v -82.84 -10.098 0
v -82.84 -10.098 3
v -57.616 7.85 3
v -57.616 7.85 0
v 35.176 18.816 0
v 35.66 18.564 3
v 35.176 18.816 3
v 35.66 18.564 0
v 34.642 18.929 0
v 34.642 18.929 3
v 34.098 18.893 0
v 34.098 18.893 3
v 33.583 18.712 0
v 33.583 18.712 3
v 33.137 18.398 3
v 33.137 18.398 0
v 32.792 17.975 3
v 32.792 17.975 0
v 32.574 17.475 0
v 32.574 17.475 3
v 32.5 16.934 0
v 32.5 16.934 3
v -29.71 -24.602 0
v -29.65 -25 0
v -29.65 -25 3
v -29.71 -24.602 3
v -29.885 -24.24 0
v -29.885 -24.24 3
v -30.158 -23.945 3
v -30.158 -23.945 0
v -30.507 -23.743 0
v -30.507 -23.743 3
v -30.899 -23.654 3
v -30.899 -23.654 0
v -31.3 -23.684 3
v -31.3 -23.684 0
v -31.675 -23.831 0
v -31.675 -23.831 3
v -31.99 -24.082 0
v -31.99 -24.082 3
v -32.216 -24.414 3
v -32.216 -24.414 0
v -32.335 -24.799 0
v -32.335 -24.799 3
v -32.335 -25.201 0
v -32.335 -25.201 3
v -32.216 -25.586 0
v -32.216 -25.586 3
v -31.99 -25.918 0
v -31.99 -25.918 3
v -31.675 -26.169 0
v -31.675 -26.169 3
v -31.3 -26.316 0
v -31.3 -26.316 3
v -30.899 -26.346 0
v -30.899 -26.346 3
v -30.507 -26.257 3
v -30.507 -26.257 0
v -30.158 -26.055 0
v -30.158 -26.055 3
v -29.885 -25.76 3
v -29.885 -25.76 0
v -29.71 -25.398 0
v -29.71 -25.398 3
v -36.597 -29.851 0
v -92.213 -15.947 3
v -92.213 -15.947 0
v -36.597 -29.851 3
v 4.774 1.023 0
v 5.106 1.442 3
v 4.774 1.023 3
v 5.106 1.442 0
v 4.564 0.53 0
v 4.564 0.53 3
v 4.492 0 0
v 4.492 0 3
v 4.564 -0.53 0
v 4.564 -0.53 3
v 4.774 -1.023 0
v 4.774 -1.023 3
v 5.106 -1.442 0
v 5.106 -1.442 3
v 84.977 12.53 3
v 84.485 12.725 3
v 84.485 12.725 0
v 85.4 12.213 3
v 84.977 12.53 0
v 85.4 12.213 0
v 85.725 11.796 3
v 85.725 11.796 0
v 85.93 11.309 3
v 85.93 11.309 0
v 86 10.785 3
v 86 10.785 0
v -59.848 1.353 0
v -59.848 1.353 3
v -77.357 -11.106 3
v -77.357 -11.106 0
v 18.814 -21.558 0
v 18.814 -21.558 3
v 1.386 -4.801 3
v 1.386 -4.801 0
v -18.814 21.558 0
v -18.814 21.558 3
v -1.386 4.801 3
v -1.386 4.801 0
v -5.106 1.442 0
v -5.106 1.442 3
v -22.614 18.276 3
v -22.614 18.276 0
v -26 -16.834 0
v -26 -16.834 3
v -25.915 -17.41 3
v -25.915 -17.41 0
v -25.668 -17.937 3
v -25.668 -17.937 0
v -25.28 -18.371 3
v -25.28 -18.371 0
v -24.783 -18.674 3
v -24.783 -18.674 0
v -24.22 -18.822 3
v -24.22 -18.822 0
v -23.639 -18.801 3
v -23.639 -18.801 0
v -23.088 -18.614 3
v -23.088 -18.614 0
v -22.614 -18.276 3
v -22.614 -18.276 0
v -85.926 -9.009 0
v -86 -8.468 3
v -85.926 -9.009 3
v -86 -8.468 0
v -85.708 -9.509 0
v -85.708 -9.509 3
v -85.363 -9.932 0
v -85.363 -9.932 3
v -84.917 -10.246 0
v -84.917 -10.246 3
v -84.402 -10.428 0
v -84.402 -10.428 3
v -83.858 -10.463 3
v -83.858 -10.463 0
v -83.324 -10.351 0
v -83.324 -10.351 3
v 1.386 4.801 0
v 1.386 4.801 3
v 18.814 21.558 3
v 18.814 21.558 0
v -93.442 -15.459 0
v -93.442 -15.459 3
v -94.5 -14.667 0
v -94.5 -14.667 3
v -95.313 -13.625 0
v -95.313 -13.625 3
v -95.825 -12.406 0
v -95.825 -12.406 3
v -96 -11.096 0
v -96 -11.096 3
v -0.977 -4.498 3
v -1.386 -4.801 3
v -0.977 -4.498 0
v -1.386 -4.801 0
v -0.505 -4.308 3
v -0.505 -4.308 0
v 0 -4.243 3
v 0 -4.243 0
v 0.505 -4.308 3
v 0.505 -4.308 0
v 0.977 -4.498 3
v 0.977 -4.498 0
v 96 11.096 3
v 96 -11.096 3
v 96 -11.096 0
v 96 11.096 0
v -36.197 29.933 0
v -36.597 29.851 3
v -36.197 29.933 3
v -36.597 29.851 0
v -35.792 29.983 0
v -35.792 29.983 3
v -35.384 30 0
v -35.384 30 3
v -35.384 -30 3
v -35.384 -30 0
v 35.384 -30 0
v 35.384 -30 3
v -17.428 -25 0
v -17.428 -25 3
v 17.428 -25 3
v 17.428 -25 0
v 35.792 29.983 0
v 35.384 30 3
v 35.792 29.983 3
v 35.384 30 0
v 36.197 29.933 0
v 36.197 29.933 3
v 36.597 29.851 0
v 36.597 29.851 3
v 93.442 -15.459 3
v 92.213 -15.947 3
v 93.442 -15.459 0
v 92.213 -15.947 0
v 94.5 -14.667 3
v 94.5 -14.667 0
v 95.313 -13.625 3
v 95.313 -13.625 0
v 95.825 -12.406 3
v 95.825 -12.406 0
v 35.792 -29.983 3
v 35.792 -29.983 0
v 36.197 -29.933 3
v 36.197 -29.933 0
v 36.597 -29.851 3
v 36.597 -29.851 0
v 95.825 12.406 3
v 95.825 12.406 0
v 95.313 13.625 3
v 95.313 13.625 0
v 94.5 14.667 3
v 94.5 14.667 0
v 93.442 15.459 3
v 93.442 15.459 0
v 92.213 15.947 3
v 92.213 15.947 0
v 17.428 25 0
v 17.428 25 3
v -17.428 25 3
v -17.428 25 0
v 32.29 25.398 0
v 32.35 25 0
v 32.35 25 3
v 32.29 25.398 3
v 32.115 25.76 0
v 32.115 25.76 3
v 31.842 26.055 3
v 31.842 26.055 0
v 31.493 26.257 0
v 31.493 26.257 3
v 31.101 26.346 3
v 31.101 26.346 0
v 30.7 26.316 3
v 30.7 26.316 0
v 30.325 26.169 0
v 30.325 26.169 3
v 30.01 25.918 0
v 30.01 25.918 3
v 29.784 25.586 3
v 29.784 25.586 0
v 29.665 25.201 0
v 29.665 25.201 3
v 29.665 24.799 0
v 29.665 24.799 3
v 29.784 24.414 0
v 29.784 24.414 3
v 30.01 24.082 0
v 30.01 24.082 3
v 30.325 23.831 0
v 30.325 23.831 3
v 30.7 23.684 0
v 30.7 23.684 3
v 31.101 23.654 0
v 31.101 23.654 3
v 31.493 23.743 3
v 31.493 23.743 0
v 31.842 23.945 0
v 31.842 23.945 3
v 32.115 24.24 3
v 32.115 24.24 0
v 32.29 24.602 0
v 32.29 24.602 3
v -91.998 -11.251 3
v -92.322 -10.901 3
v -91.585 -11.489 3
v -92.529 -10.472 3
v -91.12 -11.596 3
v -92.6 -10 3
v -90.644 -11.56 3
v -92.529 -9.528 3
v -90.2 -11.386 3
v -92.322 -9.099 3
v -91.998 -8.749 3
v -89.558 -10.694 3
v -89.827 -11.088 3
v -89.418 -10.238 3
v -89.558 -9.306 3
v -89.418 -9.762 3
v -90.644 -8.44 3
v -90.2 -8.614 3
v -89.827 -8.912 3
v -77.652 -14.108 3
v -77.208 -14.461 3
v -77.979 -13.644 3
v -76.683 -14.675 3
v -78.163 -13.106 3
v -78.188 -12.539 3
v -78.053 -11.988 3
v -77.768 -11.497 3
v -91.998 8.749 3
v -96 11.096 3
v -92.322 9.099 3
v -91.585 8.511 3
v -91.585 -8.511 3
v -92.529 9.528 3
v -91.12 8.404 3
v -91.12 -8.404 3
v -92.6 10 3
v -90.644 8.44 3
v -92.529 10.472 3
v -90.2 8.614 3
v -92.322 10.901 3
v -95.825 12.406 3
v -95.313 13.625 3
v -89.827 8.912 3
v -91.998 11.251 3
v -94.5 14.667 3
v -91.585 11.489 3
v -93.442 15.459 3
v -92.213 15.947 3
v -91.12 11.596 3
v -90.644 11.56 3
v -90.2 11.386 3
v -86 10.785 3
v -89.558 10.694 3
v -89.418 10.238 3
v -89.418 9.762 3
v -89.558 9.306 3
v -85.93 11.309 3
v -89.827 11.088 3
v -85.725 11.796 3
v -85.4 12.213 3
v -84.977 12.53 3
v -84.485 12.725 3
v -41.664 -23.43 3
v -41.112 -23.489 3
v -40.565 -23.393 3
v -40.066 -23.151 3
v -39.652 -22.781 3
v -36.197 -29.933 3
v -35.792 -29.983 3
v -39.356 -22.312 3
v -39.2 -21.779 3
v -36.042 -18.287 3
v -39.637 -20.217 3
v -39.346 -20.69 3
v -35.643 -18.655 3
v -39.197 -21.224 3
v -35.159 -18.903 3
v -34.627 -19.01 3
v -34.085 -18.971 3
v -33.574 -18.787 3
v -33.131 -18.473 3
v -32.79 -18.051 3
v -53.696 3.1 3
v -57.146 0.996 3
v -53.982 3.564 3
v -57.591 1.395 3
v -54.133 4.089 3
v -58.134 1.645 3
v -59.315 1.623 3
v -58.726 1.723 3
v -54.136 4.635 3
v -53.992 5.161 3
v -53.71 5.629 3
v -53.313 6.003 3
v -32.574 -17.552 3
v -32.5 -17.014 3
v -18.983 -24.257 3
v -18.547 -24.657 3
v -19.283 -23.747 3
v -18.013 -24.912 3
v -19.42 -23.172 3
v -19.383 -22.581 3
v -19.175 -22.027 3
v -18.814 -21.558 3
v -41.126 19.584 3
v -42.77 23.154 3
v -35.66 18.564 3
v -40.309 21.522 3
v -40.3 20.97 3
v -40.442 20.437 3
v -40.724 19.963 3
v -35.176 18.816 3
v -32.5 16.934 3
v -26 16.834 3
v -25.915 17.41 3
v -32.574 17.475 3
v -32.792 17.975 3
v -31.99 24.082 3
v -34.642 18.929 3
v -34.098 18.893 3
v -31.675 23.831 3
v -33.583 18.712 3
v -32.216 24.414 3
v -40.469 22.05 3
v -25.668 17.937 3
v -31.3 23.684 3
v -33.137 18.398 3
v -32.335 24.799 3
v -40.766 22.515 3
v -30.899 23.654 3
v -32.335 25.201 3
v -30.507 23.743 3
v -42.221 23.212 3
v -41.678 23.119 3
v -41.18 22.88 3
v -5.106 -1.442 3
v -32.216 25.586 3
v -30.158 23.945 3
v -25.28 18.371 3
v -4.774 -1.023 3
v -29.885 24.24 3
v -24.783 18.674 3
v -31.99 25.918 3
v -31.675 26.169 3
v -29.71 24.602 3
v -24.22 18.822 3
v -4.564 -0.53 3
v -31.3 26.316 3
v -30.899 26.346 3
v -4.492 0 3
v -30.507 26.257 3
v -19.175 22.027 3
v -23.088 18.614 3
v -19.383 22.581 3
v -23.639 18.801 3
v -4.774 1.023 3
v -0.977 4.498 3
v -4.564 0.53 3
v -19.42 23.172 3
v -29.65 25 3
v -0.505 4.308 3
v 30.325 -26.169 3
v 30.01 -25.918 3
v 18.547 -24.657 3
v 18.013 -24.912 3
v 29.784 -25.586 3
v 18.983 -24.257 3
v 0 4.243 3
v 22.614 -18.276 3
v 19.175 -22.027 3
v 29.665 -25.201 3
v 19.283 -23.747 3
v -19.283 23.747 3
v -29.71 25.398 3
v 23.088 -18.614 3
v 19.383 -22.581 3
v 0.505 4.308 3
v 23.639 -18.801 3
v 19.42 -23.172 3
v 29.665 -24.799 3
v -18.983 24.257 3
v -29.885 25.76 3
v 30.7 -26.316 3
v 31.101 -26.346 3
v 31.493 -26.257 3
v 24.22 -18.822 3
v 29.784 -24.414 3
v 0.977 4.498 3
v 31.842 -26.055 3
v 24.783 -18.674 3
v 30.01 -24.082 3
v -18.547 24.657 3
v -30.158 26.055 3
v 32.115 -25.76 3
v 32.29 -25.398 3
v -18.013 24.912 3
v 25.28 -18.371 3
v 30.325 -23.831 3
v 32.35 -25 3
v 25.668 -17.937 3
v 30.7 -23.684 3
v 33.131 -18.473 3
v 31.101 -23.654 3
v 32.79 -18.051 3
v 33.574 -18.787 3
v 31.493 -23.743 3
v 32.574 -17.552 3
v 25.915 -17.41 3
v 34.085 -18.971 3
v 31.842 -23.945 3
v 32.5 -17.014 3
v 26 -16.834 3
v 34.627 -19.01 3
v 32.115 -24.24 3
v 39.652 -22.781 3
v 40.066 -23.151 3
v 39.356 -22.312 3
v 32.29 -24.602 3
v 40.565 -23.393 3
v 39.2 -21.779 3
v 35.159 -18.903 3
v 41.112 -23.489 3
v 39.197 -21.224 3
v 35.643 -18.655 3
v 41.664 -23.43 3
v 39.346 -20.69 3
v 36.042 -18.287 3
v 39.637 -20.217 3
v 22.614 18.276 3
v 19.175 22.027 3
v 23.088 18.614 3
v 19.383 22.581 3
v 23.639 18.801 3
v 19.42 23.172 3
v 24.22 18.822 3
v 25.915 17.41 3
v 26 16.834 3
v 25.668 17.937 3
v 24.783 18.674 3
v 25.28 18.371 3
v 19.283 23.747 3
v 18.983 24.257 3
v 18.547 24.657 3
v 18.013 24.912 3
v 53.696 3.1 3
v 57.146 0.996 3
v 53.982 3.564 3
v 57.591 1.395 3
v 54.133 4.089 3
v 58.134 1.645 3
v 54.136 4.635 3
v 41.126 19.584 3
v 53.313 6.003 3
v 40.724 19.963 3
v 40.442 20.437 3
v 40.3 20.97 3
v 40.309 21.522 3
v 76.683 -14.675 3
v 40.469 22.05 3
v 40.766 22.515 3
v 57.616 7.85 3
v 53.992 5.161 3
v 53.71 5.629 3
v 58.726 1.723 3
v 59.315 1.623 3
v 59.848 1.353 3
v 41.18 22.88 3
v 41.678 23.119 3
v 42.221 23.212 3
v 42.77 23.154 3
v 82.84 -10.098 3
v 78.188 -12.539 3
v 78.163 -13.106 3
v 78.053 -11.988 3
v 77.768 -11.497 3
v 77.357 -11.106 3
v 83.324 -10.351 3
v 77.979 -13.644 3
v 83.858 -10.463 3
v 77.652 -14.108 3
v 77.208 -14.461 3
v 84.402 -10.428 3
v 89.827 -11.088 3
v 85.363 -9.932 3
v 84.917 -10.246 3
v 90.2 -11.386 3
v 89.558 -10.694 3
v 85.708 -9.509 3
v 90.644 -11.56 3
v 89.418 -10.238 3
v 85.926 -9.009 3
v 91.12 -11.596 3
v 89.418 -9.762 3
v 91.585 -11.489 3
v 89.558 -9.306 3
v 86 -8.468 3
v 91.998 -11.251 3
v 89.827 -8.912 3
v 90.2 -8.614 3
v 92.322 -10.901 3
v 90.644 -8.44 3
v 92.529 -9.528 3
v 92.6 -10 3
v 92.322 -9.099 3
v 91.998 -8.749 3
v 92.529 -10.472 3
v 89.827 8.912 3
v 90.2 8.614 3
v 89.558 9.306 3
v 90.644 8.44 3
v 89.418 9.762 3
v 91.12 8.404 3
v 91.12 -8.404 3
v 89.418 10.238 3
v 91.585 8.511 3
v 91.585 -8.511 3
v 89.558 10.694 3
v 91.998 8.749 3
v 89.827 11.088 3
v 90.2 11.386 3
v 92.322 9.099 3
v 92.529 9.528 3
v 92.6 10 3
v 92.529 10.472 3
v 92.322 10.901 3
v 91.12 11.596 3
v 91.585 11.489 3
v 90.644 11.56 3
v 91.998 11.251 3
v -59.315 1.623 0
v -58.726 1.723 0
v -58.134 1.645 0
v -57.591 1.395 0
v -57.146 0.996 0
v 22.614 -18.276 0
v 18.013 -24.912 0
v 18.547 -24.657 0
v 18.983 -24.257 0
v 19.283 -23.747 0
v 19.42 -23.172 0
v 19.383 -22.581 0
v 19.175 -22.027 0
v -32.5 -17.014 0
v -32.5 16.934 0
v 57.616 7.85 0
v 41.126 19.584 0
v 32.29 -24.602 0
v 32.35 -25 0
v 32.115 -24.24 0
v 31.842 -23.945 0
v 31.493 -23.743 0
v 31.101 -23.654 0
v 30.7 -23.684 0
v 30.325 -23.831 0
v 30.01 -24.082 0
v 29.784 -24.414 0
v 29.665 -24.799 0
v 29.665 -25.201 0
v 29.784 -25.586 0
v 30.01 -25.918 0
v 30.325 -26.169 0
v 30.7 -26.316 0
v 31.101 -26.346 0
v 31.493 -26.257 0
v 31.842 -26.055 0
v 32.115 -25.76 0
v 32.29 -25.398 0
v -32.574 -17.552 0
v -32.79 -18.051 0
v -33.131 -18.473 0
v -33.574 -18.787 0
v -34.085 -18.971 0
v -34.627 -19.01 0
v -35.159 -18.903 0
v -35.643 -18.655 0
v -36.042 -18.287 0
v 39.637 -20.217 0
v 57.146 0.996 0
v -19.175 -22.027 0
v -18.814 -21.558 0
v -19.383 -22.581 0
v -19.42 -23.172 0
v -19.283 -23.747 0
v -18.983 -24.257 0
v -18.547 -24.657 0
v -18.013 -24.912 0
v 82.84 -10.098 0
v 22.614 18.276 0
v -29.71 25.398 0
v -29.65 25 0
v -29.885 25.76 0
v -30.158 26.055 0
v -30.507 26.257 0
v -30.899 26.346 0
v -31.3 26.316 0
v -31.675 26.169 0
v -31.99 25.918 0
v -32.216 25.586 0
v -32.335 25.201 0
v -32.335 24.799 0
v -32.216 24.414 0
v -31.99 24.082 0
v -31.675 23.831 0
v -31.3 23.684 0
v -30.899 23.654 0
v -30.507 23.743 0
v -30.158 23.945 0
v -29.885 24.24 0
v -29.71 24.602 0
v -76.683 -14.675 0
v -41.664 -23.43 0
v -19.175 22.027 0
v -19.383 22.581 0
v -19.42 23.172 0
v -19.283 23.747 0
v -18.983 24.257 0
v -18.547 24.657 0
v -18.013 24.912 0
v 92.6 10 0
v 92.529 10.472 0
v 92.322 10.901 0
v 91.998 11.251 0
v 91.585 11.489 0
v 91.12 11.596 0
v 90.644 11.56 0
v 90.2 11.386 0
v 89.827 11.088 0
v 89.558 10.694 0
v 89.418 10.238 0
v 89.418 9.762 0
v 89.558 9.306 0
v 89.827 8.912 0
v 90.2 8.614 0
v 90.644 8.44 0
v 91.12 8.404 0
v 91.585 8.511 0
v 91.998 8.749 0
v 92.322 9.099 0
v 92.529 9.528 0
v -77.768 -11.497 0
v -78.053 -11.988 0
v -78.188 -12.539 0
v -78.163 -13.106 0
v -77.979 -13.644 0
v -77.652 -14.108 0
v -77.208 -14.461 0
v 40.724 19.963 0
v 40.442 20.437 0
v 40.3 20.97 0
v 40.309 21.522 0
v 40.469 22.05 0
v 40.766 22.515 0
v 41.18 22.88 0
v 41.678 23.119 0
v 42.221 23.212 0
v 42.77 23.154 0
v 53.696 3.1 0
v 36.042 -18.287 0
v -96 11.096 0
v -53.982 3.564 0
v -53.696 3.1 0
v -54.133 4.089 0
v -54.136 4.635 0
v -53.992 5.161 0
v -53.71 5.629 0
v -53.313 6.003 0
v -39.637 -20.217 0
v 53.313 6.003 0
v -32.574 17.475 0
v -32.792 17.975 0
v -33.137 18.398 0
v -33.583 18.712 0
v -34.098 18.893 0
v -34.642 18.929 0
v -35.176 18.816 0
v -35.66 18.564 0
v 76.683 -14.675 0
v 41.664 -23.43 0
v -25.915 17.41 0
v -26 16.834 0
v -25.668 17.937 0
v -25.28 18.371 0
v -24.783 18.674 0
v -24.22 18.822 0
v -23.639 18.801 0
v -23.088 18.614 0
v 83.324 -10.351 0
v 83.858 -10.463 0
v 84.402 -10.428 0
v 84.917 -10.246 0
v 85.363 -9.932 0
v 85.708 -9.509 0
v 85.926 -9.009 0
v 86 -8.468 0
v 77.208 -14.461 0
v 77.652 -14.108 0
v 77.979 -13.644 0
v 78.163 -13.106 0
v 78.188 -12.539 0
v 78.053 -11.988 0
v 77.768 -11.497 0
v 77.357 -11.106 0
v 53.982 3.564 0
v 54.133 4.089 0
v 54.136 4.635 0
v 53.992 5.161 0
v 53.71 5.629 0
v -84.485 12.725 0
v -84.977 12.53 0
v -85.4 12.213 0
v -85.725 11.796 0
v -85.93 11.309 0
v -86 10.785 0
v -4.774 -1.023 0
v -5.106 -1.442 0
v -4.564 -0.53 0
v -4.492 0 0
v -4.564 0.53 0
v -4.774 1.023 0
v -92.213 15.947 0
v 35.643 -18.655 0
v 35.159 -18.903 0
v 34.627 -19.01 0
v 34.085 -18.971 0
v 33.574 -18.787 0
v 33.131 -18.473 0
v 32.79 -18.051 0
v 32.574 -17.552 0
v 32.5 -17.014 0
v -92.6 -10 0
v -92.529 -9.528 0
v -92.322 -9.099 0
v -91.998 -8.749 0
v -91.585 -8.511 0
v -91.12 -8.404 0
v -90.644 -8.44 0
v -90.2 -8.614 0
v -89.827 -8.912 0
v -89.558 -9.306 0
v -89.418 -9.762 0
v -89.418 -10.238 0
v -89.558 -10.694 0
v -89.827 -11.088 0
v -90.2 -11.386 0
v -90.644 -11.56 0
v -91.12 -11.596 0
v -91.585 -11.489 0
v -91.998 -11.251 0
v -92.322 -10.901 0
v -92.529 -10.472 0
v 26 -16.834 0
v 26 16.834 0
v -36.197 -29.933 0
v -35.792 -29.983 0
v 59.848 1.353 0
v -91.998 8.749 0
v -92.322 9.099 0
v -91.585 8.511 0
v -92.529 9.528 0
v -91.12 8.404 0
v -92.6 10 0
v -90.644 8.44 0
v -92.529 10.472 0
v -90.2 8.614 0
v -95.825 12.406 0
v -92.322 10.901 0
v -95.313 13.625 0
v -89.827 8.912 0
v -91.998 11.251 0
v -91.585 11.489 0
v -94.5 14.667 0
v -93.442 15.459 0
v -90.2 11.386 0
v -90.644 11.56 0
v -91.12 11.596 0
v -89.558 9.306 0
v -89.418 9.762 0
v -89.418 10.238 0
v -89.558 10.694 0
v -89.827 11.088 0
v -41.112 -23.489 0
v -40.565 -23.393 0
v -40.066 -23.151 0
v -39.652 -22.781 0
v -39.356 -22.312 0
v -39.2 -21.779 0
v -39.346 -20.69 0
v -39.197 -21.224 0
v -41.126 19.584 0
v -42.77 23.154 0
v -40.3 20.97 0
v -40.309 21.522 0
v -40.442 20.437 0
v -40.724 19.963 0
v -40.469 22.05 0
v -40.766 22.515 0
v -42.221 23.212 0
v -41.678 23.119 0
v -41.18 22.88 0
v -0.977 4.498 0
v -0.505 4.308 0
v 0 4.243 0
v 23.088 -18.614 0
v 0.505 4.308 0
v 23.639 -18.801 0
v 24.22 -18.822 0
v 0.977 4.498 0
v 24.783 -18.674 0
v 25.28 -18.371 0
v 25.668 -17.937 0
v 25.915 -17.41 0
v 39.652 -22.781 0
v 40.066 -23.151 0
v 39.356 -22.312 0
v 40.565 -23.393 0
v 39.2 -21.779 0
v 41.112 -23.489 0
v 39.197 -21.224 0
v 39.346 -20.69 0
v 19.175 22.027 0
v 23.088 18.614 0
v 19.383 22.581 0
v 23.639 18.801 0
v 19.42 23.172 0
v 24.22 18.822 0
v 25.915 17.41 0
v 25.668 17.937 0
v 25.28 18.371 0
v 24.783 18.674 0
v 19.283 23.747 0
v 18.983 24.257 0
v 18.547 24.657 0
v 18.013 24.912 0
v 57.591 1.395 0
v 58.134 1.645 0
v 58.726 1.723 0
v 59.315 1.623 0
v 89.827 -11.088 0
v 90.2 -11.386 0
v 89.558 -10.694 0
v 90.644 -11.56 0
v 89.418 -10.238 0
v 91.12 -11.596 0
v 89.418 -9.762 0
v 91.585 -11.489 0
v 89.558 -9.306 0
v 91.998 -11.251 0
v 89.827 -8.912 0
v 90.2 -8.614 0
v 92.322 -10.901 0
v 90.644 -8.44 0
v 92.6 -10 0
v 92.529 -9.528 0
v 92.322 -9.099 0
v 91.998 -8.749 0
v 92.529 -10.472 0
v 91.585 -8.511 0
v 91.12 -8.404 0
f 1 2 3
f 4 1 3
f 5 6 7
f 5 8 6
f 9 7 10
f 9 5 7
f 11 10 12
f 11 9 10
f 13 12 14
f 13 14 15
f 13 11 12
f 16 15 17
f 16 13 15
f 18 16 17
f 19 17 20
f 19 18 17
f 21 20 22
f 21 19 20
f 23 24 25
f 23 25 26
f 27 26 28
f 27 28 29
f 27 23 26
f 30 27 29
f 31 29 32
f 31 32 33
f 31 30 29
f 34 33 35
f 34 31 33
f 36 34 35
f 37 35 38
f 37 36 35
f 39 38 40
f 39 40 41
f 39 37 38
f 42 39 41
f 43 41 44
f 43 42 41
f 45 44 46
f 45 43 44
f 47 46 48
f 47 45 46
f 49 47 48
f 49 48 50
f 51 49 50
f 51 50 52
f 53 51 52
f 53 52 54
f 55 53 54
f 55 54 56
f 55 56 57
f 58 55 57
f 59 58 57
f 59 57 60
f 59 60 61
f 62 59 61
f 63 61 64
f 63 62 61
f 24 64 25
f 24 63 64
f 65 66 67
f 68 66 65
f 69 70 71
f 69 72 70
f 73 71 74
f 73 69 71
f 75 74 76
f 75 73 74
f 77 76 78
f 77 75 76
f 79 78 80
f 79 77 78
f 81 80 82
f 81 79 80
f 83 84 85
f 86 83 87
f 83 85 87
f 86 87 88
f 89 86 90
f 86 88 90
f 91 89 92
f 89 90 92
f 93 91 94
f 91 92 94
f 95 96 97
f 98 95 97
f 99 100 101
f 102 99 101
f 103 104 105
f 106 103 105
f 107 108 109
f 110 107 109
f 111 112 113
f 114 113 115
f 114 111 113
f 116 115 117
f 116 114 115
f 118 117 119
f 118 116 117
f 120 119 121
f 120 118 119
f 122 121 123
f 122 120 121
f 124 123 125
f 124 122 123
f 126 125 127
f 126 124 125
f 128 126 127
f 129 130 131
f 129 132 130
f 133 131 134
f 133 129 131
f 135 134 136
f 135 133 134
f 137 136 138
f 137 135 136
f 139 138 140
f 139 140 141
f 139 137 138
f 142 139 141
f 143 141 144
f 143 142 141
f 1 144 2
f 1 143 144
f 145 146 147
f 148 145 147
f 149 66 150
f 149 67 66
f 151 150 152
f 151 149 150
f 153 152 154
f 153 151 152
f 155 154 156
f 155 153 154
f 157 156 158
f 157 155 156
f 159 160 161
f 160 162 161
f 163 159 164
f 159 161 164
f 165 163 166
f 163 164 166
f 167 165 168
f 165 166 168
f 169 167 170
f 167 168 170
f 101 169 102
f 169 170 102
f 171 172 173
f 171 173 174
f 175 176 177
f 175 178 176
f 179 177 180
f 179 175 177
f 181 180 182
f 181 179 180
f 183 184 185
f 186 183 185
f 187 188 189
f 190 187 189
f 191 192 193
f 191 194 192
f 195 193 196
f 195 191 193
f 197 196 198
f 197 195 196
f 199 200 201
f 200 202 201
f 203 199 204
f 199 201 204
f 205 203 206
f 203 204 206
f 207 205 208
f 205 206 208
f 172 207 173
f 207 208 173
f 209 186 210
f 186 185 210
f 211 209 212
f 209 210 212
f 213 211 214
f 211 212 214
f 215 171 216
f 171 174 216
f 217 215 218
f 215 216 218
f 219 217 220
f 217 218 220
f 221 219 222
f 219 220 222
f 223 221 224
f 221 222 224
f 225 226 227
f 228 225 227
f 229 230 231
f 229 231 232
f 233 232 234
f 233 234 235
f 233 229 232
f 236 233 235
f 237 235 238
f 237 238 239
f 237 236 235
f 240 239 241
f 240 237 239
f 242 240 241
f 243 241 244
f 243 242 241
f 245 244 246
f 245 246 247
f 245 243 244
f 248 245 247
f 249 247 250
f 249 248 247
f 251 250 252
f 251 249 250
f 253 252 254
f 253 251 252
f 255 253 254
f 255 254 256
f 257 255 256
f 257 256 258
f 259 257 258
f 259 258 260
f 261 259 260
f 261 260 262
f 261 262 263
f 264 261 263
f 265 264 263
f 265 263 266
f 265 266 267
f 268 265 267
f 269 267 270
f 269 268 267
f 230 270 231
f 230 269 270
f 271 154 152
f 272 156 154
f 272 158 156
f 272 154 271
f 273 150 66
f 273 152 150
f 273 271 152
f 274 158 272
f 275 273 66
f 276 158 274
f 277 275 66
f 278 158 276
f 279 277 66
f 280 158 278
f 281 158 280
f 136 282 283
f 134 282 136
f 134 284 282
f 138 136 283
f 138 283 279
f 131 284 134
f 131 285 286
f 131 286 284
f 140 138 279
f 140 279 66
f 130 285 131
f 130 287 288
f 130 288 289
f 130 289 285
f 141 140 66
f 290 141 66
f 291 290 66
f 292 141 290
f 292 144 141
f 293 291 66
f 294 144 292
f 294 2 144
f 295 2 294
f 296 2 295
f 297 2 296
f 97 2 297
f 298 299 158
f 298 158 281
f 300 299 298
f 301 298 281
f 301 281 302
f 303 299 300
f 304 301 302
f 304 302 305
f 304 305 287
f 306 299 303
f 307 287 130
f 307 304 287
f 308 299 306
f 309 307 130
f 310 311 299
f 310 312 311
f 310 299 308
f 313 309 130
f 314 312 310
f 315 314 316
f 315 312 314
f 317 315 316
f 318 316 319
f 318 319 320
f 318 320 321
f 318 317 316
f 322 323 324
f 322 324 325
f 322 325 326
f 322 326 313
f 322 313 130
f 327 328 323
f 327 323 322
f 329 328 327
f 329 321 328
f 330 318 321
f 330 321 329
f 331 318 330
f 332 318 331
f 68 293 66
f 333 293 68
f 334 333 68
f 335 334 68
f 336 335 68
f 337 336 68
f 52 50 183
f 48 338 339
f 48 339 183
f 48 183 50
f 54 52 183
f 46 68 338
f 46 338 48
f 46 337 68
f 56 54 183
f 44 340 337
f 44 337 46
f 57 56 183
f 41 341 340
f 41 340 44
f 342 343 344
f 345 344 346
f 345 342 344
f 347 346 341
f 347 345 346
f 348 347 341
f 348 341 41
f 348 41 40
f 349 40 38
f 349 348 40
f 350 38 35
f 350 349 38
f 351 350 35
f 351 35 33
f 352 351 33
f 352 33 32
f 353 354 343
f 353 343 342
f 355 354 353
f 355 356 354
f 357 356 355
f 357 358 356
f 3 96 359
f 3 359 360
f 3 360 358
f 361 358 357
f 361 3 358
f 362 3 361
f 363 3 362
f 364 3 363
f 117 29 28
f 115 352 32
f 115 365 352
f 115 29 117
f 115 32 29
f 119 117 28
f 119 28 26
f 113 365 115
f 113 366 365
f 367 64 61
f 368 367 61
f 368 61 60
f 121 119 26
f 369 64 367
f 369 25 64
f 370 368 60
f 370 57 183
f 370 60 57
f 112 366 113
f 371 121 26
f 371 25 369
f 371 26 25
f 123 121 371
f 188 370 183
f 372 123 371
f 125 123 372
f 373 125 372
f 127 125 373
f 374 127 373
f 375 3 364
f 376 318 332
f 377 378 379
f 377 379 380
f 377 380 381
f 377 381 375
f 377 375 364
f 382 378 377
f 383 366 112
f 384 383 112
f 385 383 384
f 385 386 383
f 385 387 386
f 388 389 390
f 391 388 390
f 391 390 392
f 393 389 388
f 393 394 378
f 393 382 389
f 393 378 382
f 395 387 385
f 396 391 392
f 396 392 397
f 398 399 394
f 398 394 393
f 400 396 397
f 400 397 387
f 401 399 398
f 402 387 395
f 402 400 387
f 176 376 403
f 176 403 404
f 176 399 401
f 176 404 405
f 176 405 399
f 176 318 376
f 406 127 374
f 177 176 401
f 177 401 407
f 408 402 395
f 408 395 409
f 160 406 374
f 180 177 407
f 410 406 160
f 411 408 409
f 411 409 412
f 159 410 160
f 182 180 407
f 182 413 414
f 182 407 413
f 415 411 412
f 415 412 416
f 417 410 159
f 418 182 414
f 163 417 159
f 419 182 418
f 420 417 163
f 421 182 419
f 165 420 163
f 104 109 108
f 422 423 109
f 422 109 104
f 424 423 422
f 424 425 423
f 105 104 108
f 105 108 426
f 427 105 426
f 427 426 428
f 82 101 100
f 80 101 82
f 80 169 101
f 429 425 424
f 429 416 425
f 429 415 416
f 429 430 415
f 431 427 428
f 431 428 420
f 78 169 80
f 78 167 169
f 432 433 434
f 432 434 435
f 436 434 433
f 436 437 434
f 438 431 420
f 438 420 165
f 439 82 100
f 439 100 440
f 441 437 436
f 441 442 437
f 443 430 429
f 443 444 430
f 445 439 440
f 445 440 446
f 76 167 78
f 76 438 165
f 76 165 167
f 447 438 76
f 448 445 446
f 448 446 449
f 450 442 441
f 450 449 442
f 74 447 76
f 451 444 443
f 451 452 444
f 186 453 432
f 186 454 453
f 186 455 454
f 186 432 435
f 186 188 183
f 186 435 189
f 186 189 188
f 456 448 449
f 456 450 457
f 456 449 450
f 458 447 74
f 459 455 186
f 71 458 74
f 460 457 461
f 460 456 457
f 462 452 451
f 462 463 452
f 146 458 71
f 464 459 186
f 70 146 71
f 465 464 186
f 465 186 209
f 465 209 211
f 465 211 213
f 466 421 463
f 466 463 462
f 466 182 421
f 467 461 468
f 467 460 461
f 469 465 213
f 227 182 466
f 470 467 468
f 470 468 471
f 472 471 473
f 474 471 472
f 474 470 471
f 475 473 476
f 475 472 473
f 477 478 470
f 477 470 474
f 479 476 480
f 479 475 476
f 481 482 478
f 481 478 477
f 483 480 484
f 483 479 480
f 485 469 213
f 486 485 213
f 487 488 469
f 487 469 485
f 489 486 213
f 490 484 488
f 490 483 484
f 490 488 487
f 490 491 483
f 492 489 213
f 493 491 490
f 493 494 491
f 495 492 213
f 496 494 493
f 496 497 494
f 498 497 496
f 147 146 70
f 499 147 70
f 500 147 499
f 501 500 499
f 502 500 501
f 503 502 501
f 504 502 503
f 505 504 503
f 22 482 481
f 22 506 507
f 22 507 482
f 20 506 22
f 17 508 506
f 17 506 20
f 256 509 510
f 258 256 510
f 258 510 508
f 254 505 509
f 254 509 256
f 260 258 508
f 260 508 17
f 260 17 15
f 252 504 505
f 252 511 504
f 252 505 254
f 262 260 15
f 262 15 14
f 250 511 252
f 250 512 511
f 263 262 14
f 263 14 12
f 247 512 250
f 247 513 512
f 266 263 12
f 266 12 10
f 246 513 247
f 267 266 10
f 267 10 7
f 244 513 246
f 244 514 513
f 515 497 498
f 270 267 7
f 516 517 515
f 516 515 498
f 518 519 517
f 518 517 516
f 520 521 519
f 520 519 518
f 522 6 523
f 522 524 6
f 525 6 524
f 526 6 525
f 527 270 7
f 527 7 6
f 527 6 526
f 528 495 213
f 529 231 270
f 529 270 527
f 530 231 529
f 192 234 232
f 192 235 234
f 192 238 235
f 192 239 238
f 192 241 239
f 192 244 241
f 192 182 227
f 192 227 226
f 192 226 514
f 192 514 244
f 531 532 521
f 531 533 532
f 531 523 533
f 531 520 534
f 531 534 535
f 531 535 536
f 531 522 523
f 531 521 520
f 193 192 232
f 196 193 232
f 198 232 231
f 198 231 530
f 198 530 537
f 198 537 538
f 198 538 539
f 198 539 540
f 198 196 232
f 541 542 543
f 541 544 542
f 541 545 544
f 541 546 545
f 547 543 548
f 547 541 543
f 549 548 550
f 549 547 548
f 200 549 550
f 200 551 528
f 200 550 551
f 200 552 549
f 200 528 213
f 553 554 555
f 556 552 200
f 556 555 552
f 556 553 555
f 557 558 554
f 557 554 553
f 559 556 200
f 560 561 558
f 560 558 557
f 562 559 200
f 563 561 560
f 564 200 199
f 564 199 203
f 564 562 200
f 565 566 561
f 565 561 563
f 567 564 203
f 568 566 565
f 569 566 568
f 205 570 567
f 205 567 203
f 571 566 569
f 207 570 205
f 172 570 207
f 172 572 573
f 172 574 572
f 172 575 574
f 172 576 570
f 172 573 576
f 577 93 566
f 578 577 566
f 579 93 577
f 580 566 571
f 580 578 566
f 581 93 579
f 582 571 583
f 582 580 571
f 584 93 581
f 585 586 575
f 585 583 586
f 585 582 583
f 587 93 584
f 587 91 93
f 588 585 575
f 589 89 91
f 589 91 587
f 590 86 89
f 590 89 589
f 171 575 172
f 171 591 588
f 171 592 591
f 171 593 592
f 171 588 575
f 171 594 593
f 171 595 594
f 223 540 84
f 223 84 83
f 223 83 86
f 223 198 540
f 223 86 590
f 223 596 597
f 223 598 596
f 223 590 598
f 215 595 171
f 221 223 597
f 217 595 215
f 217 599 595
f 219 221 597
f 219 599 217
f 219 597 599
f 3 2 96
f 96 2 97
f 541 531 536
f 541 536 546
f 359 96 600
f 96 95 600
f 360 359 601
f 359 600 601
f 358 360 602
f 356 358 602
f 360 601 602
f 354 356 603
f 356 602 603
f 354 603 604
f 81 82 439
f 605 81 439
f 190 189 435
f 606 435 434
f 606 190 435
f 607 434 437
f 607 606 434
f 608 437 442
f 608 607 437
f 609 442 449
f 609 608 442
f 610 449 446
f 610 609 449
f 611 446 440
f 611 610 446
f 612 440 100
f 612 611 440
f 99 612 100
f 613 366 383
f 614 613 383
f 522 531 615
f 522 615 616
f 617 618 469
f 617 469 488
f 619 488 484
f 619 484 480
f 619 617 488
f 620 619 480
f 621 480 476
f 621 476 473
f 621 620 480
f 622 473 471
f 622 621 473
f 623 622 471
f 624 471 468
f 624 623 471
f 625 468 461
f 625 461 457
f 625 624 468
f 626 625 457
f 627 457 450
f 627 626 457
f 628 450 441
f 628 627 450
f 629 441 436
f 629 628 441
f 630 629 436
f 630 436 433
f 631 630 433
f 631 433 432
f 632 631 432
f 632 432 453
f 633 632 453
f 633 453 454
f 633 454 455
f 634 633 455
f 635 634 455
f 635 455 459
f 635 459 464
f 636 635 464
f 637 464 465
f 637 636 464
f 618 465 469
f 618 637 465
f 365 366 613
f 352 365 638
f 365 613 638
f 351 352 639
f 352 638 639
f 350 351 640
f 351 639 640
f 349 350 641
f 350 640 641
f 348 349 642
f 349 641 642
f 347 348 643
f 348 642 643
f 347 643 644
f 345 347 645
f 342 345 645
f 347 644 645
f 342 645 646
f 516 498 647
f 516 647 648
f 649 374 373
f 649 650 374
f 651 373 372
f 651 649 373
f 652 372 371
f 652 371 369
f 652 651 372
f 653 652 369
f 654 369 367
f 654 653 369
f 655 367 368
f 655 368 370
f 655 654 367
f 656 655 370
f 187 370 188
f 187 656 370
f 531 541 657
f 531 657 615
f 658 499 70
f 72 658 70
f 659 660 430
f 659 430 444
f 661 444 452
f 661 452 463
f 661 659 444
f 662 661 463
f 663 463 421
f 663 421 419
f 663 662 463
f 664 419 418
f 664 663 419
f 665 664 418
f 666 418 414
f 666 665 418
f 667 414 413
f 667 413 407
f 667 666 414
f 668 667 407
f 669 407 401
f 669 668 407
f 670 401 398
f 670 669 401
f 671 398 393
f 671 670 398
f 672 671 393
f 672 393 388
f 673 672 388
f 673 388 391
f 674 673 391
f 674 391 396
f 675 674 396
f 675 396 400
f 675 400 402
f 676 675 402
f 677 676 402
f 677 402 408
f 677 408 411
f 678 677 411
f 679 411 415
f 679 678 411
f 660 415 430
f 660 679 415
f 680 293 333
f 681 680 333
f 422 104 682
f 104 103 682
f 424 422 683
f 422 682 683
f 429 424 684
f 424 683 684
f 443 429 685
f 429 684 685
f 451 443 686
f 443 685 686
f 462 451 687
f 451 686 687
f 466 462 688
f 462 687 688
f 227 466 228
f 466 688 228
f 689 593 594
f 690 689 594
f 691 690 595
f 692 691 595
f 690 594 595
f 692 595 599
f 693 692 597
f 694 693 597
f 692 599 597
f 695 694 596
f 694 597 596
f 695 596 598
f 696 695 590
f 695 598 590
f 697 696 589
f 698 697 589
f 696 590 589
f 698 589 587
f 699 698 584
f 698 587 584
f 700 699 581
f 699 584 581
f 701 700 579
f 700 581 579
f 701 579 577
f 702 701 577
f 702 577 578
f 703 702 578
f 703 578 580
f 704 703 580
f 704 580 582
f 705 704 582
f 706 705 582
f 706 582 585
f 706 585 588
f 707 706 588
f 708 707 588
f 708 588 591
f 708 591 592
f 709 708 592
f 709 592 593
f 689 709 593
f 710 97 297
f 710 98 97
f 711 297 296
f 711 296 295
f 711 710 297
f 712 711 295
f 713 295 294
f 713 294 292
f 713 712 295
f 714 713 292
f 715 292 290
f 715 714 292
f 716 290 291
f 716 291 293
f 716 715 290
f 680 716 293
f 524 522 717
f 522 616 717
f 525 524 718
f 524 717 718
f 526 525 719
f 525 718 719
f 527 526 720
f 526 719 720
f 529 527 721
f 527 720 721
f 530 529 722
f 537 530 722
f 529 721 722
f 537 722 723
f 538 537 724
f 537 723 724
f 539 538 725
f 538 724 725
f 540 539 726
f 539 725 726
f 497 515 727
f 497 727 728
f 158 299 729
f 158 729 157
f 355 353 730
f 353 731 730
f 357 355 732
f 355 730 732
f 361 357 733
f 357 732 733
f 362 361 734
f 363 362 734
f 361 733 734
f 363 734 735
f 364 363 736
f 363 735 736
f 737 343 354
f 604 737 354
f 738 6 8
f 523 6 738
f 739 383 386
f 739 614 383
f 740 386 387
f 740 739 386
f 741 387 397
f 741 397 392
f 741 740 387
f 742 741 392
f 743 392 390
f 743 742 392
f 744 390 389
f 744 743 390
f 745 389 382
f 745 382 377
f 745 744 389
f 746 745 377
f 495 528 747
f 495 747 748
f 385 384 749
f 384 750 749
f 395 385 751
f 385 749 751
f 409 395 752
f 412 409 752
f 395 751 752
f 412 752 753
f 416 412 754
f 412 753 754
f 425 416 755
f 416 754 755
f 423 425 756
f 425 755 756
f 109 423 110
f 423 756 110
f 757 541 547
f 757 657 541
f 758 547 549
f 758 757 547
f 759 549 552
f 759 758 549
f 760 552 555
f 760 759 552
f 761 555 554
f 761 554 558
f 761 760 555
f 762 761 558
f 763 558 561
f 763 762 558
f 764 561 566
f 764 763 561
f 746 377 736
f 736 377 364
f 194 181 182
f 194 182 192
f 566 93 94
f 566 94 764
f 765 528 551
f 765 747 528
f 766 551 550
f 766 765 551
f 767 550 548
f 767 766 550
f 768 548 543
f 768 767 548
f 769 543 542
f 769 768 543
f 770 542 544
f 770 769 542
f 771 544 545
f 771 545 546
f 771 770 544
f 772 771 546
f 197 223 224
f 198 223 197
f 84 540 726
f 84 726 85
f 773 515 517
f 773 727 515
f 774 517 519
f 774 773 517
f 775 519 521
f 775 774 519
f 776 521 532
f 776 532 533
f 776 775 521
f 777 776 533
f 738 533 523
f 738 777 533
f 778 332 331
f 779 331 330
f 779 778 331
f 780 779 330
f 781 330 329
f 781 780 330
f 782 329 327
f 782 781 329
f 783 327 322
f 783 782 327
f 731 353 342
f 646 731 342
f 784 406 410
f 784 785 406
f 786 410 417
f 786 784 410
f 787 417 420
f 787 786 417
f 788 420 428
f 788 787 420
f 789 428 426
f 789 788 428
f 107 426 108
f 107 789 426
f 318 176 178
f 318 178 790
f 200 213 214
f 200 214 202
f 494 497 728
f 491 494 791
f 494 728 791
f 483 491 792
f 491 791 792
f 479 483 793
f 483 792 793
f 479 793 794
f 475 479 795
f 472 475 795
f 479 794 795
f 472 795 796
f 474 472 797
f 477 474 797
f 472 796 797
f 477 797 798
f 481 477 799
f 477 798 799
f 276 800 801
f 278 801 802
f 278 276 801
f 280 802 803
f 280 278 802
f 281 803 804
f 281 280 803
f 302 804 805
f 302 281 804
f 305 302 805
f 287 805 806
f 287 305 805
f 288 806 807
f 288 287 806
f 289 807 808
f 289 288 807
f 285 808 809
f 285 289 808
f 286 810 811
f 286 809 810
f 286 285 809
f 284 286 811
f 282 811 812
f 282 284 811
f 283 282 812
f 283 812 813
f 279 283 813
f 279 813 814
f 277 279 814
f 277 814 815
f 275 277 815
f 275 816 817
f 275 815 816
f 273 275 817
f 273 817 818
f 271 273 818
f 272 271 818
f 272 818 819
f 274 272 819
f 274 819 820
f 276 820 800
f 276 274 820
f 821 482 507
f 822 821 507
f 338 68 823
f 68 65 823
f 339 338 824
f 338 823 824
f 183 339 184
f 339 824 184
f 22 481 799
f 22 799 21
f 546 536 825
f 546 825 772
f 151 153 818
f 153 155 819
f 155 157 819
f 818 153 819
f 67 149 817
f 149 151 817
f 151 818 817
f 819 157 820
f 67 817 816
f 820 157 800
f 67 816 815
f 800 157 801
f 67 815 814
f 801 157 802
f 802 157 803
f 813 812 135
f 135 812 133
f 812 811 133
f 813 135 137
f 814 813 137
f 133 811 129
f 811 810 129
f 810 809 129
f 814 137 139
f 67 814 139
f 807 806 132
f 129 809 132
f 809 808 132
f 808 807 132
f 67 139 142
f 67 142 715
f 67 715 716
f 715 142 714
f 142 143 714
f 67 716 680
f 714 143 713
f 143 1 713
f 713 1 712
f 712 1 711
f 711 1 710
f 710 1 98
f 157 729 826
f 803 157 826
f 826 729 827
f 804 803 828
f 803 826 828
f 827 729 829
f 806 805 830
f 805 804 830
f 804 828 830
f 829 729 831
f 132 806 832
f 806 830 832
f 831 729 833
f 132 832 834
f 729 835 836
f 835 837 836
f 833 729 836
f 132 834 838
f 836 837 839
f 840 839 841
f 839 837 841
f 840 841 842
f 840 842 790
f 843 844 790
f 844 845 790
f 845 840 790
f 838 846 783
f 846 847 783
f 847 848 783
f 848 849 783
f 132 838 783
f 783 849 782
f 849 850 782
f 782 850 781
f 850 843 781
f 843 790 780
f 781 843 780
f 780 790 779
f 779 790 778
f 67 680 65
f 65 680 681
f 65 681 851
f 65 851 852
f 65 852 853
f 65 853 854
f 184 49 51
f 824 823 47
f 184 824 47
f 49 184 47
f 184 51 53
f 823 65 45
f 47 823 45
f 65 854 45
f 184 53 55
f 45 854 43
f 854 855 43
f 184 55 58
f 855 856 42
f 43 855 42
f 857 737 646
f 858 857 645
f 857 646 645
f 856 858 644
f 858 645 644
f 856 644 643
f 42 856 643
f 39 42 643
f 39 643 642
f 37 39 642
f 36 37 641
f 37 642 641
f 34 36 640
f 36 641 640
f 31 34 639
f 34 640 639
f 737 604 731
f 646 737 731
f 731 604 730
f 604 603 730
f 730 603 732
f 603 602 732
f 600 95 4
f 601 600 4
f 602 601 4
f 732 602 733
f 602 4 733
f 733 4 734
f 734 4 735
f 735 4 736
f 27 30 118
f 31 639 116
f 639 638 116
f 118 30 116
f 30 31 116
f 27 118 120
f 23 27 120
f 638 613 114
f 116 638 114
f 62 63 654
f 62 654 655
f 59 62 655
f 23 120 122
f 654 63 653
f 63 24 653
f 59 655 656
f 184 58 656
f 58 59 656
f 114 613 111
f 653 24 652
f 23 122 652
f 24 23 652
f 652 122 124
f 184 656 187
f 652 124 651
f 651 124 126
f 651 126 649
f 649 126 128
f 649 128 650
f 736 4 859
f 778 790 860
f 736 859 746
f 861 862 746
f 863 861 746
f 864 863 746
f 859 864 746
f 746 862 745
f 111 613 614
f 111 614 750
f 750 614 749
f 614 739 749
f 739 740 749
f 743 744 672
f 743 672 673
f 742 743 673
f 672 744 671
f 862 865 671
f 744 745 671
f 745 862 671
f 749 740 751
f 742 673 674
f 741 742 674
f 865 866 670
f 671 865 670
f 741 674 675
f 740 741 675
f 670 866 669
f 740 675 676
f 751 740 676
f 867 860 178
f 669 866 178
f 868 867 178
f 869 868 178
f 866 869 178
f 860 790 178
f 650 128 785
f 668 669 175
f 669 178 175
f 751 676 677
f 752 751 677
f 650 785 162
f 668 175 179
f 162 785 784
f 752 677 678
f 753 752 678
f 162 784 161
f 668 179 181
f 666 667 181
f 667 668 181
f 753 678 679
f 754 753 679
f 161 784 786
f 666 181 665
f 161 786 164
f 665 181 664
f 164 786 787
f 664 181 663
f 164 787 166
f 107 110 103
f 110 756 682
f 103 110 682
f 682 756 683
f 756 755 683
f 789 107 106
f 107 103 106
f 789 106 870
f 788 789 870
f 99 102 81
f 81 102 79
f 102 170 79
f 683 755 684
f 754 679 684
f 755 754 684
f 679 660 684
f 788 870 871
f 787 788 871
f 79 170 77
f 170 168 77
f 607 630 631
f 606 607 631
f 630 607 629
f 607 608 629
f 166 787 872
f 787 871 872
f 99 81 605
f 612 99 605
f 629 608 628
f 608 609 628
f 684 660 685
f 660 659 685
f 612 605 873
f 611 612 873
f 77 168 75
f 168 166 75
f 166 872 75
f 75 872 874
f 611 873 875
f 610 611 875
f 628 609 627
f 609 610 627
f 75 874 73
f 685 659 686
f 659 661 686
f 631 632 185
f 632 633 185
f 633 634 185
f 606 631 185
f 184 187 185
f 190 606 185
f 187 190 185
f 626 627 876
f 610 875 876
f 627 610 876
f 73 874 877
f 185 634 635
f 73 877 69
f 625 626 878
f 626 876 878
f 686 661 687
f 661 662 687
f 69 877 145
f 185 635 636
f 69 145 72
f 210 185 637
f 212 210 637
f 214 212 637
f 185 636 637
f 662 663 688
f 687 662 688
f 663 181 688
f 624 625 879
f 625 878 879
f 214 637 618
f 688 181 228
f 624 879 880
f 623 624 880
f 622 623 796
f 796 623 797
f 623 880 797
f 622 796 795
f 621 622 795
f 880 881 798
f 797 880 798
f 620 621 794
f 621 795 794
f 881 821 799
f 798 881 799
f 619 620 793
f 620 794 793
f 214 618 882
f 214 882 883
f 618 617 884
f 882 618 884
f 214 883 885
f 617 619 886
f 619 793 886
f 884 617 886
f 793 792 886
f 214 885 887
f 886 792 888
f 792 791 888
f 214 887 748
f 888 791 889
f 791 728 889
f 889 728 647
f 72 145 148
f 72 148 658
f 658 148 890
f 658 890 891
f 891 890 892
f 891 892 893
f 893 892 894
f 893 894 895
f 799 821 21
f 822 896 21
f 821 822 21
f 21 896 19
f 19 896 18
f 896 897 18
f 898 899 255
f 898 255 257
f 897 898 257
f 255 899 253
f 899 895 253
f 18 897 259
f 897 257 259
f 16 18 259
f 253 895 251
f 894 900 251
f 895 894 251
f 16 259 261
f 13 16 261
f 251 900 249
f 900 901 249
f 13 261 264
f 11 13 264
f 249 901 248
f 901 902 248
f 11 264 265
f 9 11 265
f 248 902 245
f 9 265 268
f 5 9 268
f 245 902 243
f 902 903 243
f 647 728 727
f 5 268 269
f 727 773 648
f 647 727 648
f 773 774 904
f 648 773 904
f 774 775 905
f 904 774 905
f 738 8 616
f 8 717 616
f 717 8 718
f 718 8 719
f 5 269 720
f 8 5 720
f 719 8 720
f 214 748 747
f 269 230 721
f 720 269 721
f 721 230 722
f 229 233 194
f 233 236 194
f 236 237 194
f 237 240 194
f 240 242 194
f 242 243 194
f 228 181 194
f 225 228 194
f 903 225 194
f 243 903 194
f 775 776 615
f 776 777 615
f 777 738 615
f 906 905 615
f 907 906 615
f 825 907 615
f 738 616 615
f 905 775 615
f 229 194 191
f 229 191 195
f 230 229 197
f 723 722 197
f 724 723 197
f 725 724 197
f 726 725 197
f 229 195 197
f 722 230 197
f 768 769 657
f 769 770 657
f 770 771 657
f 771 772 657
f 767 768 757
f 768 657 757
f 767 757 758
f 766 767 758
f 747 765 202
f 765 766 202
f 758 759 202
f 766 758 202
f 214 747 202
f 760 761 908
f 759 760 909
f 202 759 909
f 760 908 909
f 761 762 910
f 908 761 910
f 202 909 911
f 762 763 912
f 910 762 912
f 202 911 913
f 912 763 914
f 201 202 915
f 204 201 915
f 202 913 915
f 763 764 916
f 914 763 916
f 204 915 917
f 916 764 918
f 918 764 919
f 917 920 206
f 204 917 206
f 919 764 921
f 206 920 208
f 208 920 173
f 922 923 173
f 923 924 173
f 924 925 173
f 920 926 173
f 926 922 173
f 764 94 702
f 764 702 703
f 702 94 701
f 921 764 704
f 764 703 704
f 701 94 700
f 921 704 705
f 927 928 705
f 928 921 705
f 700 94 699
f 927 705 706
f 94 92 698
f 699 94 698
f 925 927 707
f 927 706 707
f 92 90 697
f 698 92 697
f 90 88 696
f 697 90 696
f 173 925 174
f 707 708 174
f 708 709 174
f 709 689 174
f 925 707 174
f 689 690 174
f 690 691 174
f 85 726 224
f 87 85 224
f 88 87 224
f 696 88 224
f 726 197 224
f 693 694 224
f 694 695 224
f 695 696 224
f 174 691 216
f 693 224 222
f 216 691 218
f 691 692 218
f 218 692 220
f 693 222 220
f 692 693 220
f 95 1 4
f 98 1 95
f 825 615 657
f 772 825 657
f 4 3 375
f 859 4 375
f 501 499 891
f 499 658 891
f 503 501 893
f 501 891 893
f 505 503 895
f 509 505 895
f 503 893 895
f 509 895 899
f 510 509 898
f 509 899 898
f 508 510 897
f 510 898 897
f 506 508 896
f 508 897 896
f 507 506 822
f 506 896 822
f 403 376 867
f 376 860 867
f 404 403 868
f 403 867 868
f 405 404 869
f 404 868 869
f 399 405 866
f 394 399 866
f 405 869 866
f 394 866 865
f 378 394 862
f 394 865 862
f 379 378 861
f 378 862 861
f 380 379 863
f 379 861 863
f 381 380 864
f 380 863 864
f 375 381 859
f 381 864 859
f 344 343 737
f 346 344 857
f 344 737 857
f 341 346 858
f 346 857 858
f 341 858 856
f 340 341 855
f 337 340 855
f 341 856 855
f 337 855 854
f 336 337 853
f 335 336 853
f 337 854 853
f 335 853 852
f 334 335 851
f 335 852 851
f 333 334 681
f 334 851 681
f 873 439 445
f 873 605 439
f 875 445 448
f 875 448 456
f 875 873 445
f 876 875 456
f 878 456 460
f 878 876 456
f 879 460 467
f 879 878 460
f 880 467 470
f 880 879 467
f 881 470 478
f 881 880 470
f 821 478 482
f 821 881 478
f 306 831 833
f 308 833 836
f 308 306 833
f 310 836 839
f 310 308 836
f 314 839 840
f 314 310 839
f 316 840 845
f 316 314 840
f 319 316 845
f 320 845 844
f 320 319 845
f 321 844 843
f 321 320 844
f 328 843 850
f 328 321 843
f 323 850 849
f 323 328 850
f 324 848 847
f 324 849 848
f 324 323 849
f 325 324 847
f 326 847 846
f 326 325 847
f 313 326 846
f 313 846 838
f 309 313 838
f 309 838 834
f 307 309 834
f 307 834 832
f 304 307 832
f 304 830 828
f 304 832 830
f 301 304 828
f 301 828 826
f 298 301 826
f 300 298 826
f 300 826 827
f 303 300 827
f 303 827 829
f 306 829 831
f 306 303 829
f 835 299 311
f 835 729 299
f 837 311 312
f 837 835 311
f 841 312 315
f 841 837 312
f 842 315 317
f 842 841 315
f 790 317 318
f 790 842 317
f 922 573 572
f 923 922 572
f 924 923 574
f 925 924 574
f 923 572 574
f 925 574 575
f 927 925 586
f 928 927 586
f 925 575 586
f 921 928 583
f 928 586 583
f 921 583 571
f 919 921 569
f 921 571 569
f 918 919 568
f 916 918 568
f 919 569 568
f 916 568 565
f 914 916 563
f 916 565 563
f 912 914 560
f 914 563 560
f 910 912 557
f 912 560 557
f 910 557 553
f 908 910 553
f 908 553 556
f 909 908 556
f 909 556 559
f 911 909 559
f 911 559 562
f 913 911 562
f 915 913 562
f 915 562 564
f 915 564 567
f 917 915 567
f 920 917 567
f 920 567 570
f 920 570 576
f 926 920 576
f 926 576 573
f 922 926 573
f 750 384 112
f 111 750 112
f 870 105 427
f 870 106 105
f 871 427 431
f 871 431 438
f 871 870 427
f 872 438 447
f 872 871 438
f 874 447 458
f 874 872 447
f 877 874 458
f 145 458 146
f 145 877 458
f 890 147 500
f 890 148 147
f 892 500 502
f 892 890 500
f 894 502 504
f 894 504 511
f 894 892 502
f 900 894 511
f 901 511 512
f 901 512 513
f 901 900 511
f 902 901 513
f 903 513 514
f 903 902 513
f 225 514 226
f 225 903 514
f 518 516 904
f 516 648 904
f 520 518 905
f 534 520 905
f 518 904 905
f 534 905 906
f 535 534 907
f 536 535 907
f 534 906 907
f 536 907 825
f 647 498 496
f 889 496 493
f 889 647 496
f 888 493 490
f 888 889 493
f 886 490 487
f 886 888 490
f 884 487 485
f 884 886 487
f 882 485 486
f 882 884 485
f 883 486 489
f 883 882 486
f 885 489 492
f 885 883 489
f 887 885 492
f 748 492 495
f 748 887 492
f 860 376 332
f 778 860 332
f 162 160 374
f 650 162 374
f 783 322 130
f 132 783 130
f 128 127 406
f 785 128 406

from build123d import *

# Parameters (mm, degrees)
SKETCH_1_W          = 202
SKETCH_1_H          = 60
SKETCH_1_R          = 1.35
EXTRUDE_1_DEPTH     = 3
SKETCH_2_R          = 1.6
CUT_EXTRUDE_1_DEPTH = 10
SKETCH_3_OUTSIDE_W  = 246.148
SKETCH_3_OUTSIDE_H  = 104.148
CUT_EXTRUDE_2_DEPTH = 10
CUT_EXTRUDE_3_DEPTH = 10
CUT_EXTRUDE_4_DEPTH = 10
FILLET_1_R          = 2
FILLET_2_R          = 5


with BuildPart() as part:
    # 草图1 → 凸台-拉伸1 (new body)
    with BuildSketch(Plane.XY):
        Rectangle(SKETCH_1_W, SKETCH_1_H)
        with Locations((31, 25)):
            Circle(SKETCH_1_R, mode=Mode.SUBTRACT)
        with Locations((-31, 25)):
            Circle(SKETCH_1_R, mode=Mode.SUBTRACT)
        with Locations((-31, -25)):
            Circle(SKETCH_1_R, mode=Mode.SUBTRACT)
        with Locations((31, -25)):
            Circle(SKETCH_1_R, mode=Mode.SUBTRACT)
    extrude(amount=EXTRUDE_1_DEPTH)

    # 草图2 → 切除-拉伸1 (cut)
    with BuildSketch(Plane.XY.offset(3)):
        with Locations((91, -10)):
            Circle(SKETCH_2_R)
        with Locations((91, 10)):
            Circle(SKETCH_2_R)
    cut_extrude_1 = extrude(amount=-CUT_EXTRUDE_1_DEPTH, mode=Mode.SUBTRACT)

    # 镜向1: 切除-拉伸1 across plane
    add(cut_extrude_1.mirror(Plane(origin=(0, 0, 0), x_dir=(0, 0, 1), z_dir=(1, 0, 0))), mode=Mode.SUBTRACT)

    # 草图3 outside → 切除-拉伸2 (cut)
    with BuildSketch(Plane.XY.offset(3)):
        Rectangle(SKETCH_3_OUTSIDE_W, SKETCH_3_OUTSIDE_H)
        Polygon((-96, 15), (-96, -15), (-36, -30), (36, -30), (96, -15), (96, 15), (36, 30), (-36, 30), align=None, mode=Mode.SUBTRACT)
    extrude(amount=-CUT_EXTRUDE_2_DEPTH, mode=Mode.SUBTRACT)

    # 草图4 → 切除-拉伸3 (cut)
    with BuildSketch(Plane.XY.offset(3)):
        Polygon((-32.5, 25.721117968), (-86, 12.346117968), (-86, -12.346117968), (-57.616230147, 7.849987896), align=None)
        Polygon((-58.330965527, 2.432194903), (-80.89439135, -13.622520131), (-35.767539705, -24.904233042), align=None)
        Polygon((-32.5, -22.579257249), (-32.5, 20.811885729), (-55.063425822, 4.757170695), align=None)
    cut_extrude_3 = extrude(amount=-CUT_EXTRUDE_3_DEPTH, mode=Mode.SUBTRACT)

    # 镜向2: 切除-拉伸3 across plane
    add(cut_extrude_3.mirror(Plane(origin=(0, 0, 0), x_dir=(0, 0, 1), z_dir=(1, 0, 0))), mode=Mode.SUBTRACT)

    # 草图6 → 切除-拉伸4 (cut)
    with BuildSketch(Plane.XY.offset(3)):
        Polygon((-26, 21.531790616), (-26, -21.531790616), (-3.606937759, 0), align=None)
        Polygon((-22.393062241, 25), (0, 3.468209384), (22.393062241, 25), align=None)
        Polygon((26, 21.531790616), (3.606937759, 0), (26, -21.531790616), align=None)
        Polygon((0, -3.468209384), (-22.393062241, -25), (22.393062241, -25), align=None)
    extrude(amount=-CUT_EXTRUDE_4_DEPTH, mode=Mode.SUBTRACT)

    # 圆角1
    fillet_1_edges = [part.edges().sort_by_distance(p)[0] for p in [
        (-55.063425822, 4.757170695, 1.5),
        (-32.5, 20.811885729, 1.5),
        (-32.5, -22.579257249, 1.5),
        (-58.330965527, 2.432194903, 1.5),
        (-35.767539705, -24.904233042, 1.5),
        (-80.89439135, -13.622520131, 1.5),
        (-32.5, 25.721117968, 1.5),
        (-86, -12.346117968, 1.5),
        (-86, 12.346117968, 1.5),
        (32.5, 20.811885729, 1.5),
        (55.063425822, 4.757170695, 1.5),
        (32.5, -22.579257249, 1.5),
        (35.767539705, -24.904233042, 1.5),
        (58.330965527, 2.432194903, 1.5),
        (80.89439135, -13.622520131, 1.5),
        (86, -12.346117968, 1.5),
        (32.5, 25.721117968, 1.5),
        (86, 12.346117968, 1.5),
        (3.606937759, 0, 1.5),
        (26, 21.531790616, 1.5),
        (26, -21.531790616, 1.5),
        (0, 3.468209384, 1.5),
        (-22.393062241, 25, 1.5),
        (22.393062241, 25, 1.5),
        (-22.393062241, -25, 1.5),
        (0, -3.468209384, 1.5),
        (22.393062241, -25, 1.5),
        (-26, -21.531790616, 1.5),
        (-26, 21.531790616, 1.5),
        (-3.606937759, 0, 1.5),
    ]]
    fillet(fillet_1_edges, radius=FILLET_1_R)

    # 圆角2
    fillet_2_edges = [part.edges().sort_by_distance(p)[0] for p in [
        (-36, -30, 1.5),
        (36, -30, 1.5),
        (36, 30, 1.5),
        (-36, 30, 1.5),
        (96, 15, 1.5),
        (96, -15, 1.5),
        (-96, -15, 1.5),
        (-96, 15, 1.5),
    ]]
    fillet(fillet_2_edges, radius=FILLET_2_R)


solid = part.part
